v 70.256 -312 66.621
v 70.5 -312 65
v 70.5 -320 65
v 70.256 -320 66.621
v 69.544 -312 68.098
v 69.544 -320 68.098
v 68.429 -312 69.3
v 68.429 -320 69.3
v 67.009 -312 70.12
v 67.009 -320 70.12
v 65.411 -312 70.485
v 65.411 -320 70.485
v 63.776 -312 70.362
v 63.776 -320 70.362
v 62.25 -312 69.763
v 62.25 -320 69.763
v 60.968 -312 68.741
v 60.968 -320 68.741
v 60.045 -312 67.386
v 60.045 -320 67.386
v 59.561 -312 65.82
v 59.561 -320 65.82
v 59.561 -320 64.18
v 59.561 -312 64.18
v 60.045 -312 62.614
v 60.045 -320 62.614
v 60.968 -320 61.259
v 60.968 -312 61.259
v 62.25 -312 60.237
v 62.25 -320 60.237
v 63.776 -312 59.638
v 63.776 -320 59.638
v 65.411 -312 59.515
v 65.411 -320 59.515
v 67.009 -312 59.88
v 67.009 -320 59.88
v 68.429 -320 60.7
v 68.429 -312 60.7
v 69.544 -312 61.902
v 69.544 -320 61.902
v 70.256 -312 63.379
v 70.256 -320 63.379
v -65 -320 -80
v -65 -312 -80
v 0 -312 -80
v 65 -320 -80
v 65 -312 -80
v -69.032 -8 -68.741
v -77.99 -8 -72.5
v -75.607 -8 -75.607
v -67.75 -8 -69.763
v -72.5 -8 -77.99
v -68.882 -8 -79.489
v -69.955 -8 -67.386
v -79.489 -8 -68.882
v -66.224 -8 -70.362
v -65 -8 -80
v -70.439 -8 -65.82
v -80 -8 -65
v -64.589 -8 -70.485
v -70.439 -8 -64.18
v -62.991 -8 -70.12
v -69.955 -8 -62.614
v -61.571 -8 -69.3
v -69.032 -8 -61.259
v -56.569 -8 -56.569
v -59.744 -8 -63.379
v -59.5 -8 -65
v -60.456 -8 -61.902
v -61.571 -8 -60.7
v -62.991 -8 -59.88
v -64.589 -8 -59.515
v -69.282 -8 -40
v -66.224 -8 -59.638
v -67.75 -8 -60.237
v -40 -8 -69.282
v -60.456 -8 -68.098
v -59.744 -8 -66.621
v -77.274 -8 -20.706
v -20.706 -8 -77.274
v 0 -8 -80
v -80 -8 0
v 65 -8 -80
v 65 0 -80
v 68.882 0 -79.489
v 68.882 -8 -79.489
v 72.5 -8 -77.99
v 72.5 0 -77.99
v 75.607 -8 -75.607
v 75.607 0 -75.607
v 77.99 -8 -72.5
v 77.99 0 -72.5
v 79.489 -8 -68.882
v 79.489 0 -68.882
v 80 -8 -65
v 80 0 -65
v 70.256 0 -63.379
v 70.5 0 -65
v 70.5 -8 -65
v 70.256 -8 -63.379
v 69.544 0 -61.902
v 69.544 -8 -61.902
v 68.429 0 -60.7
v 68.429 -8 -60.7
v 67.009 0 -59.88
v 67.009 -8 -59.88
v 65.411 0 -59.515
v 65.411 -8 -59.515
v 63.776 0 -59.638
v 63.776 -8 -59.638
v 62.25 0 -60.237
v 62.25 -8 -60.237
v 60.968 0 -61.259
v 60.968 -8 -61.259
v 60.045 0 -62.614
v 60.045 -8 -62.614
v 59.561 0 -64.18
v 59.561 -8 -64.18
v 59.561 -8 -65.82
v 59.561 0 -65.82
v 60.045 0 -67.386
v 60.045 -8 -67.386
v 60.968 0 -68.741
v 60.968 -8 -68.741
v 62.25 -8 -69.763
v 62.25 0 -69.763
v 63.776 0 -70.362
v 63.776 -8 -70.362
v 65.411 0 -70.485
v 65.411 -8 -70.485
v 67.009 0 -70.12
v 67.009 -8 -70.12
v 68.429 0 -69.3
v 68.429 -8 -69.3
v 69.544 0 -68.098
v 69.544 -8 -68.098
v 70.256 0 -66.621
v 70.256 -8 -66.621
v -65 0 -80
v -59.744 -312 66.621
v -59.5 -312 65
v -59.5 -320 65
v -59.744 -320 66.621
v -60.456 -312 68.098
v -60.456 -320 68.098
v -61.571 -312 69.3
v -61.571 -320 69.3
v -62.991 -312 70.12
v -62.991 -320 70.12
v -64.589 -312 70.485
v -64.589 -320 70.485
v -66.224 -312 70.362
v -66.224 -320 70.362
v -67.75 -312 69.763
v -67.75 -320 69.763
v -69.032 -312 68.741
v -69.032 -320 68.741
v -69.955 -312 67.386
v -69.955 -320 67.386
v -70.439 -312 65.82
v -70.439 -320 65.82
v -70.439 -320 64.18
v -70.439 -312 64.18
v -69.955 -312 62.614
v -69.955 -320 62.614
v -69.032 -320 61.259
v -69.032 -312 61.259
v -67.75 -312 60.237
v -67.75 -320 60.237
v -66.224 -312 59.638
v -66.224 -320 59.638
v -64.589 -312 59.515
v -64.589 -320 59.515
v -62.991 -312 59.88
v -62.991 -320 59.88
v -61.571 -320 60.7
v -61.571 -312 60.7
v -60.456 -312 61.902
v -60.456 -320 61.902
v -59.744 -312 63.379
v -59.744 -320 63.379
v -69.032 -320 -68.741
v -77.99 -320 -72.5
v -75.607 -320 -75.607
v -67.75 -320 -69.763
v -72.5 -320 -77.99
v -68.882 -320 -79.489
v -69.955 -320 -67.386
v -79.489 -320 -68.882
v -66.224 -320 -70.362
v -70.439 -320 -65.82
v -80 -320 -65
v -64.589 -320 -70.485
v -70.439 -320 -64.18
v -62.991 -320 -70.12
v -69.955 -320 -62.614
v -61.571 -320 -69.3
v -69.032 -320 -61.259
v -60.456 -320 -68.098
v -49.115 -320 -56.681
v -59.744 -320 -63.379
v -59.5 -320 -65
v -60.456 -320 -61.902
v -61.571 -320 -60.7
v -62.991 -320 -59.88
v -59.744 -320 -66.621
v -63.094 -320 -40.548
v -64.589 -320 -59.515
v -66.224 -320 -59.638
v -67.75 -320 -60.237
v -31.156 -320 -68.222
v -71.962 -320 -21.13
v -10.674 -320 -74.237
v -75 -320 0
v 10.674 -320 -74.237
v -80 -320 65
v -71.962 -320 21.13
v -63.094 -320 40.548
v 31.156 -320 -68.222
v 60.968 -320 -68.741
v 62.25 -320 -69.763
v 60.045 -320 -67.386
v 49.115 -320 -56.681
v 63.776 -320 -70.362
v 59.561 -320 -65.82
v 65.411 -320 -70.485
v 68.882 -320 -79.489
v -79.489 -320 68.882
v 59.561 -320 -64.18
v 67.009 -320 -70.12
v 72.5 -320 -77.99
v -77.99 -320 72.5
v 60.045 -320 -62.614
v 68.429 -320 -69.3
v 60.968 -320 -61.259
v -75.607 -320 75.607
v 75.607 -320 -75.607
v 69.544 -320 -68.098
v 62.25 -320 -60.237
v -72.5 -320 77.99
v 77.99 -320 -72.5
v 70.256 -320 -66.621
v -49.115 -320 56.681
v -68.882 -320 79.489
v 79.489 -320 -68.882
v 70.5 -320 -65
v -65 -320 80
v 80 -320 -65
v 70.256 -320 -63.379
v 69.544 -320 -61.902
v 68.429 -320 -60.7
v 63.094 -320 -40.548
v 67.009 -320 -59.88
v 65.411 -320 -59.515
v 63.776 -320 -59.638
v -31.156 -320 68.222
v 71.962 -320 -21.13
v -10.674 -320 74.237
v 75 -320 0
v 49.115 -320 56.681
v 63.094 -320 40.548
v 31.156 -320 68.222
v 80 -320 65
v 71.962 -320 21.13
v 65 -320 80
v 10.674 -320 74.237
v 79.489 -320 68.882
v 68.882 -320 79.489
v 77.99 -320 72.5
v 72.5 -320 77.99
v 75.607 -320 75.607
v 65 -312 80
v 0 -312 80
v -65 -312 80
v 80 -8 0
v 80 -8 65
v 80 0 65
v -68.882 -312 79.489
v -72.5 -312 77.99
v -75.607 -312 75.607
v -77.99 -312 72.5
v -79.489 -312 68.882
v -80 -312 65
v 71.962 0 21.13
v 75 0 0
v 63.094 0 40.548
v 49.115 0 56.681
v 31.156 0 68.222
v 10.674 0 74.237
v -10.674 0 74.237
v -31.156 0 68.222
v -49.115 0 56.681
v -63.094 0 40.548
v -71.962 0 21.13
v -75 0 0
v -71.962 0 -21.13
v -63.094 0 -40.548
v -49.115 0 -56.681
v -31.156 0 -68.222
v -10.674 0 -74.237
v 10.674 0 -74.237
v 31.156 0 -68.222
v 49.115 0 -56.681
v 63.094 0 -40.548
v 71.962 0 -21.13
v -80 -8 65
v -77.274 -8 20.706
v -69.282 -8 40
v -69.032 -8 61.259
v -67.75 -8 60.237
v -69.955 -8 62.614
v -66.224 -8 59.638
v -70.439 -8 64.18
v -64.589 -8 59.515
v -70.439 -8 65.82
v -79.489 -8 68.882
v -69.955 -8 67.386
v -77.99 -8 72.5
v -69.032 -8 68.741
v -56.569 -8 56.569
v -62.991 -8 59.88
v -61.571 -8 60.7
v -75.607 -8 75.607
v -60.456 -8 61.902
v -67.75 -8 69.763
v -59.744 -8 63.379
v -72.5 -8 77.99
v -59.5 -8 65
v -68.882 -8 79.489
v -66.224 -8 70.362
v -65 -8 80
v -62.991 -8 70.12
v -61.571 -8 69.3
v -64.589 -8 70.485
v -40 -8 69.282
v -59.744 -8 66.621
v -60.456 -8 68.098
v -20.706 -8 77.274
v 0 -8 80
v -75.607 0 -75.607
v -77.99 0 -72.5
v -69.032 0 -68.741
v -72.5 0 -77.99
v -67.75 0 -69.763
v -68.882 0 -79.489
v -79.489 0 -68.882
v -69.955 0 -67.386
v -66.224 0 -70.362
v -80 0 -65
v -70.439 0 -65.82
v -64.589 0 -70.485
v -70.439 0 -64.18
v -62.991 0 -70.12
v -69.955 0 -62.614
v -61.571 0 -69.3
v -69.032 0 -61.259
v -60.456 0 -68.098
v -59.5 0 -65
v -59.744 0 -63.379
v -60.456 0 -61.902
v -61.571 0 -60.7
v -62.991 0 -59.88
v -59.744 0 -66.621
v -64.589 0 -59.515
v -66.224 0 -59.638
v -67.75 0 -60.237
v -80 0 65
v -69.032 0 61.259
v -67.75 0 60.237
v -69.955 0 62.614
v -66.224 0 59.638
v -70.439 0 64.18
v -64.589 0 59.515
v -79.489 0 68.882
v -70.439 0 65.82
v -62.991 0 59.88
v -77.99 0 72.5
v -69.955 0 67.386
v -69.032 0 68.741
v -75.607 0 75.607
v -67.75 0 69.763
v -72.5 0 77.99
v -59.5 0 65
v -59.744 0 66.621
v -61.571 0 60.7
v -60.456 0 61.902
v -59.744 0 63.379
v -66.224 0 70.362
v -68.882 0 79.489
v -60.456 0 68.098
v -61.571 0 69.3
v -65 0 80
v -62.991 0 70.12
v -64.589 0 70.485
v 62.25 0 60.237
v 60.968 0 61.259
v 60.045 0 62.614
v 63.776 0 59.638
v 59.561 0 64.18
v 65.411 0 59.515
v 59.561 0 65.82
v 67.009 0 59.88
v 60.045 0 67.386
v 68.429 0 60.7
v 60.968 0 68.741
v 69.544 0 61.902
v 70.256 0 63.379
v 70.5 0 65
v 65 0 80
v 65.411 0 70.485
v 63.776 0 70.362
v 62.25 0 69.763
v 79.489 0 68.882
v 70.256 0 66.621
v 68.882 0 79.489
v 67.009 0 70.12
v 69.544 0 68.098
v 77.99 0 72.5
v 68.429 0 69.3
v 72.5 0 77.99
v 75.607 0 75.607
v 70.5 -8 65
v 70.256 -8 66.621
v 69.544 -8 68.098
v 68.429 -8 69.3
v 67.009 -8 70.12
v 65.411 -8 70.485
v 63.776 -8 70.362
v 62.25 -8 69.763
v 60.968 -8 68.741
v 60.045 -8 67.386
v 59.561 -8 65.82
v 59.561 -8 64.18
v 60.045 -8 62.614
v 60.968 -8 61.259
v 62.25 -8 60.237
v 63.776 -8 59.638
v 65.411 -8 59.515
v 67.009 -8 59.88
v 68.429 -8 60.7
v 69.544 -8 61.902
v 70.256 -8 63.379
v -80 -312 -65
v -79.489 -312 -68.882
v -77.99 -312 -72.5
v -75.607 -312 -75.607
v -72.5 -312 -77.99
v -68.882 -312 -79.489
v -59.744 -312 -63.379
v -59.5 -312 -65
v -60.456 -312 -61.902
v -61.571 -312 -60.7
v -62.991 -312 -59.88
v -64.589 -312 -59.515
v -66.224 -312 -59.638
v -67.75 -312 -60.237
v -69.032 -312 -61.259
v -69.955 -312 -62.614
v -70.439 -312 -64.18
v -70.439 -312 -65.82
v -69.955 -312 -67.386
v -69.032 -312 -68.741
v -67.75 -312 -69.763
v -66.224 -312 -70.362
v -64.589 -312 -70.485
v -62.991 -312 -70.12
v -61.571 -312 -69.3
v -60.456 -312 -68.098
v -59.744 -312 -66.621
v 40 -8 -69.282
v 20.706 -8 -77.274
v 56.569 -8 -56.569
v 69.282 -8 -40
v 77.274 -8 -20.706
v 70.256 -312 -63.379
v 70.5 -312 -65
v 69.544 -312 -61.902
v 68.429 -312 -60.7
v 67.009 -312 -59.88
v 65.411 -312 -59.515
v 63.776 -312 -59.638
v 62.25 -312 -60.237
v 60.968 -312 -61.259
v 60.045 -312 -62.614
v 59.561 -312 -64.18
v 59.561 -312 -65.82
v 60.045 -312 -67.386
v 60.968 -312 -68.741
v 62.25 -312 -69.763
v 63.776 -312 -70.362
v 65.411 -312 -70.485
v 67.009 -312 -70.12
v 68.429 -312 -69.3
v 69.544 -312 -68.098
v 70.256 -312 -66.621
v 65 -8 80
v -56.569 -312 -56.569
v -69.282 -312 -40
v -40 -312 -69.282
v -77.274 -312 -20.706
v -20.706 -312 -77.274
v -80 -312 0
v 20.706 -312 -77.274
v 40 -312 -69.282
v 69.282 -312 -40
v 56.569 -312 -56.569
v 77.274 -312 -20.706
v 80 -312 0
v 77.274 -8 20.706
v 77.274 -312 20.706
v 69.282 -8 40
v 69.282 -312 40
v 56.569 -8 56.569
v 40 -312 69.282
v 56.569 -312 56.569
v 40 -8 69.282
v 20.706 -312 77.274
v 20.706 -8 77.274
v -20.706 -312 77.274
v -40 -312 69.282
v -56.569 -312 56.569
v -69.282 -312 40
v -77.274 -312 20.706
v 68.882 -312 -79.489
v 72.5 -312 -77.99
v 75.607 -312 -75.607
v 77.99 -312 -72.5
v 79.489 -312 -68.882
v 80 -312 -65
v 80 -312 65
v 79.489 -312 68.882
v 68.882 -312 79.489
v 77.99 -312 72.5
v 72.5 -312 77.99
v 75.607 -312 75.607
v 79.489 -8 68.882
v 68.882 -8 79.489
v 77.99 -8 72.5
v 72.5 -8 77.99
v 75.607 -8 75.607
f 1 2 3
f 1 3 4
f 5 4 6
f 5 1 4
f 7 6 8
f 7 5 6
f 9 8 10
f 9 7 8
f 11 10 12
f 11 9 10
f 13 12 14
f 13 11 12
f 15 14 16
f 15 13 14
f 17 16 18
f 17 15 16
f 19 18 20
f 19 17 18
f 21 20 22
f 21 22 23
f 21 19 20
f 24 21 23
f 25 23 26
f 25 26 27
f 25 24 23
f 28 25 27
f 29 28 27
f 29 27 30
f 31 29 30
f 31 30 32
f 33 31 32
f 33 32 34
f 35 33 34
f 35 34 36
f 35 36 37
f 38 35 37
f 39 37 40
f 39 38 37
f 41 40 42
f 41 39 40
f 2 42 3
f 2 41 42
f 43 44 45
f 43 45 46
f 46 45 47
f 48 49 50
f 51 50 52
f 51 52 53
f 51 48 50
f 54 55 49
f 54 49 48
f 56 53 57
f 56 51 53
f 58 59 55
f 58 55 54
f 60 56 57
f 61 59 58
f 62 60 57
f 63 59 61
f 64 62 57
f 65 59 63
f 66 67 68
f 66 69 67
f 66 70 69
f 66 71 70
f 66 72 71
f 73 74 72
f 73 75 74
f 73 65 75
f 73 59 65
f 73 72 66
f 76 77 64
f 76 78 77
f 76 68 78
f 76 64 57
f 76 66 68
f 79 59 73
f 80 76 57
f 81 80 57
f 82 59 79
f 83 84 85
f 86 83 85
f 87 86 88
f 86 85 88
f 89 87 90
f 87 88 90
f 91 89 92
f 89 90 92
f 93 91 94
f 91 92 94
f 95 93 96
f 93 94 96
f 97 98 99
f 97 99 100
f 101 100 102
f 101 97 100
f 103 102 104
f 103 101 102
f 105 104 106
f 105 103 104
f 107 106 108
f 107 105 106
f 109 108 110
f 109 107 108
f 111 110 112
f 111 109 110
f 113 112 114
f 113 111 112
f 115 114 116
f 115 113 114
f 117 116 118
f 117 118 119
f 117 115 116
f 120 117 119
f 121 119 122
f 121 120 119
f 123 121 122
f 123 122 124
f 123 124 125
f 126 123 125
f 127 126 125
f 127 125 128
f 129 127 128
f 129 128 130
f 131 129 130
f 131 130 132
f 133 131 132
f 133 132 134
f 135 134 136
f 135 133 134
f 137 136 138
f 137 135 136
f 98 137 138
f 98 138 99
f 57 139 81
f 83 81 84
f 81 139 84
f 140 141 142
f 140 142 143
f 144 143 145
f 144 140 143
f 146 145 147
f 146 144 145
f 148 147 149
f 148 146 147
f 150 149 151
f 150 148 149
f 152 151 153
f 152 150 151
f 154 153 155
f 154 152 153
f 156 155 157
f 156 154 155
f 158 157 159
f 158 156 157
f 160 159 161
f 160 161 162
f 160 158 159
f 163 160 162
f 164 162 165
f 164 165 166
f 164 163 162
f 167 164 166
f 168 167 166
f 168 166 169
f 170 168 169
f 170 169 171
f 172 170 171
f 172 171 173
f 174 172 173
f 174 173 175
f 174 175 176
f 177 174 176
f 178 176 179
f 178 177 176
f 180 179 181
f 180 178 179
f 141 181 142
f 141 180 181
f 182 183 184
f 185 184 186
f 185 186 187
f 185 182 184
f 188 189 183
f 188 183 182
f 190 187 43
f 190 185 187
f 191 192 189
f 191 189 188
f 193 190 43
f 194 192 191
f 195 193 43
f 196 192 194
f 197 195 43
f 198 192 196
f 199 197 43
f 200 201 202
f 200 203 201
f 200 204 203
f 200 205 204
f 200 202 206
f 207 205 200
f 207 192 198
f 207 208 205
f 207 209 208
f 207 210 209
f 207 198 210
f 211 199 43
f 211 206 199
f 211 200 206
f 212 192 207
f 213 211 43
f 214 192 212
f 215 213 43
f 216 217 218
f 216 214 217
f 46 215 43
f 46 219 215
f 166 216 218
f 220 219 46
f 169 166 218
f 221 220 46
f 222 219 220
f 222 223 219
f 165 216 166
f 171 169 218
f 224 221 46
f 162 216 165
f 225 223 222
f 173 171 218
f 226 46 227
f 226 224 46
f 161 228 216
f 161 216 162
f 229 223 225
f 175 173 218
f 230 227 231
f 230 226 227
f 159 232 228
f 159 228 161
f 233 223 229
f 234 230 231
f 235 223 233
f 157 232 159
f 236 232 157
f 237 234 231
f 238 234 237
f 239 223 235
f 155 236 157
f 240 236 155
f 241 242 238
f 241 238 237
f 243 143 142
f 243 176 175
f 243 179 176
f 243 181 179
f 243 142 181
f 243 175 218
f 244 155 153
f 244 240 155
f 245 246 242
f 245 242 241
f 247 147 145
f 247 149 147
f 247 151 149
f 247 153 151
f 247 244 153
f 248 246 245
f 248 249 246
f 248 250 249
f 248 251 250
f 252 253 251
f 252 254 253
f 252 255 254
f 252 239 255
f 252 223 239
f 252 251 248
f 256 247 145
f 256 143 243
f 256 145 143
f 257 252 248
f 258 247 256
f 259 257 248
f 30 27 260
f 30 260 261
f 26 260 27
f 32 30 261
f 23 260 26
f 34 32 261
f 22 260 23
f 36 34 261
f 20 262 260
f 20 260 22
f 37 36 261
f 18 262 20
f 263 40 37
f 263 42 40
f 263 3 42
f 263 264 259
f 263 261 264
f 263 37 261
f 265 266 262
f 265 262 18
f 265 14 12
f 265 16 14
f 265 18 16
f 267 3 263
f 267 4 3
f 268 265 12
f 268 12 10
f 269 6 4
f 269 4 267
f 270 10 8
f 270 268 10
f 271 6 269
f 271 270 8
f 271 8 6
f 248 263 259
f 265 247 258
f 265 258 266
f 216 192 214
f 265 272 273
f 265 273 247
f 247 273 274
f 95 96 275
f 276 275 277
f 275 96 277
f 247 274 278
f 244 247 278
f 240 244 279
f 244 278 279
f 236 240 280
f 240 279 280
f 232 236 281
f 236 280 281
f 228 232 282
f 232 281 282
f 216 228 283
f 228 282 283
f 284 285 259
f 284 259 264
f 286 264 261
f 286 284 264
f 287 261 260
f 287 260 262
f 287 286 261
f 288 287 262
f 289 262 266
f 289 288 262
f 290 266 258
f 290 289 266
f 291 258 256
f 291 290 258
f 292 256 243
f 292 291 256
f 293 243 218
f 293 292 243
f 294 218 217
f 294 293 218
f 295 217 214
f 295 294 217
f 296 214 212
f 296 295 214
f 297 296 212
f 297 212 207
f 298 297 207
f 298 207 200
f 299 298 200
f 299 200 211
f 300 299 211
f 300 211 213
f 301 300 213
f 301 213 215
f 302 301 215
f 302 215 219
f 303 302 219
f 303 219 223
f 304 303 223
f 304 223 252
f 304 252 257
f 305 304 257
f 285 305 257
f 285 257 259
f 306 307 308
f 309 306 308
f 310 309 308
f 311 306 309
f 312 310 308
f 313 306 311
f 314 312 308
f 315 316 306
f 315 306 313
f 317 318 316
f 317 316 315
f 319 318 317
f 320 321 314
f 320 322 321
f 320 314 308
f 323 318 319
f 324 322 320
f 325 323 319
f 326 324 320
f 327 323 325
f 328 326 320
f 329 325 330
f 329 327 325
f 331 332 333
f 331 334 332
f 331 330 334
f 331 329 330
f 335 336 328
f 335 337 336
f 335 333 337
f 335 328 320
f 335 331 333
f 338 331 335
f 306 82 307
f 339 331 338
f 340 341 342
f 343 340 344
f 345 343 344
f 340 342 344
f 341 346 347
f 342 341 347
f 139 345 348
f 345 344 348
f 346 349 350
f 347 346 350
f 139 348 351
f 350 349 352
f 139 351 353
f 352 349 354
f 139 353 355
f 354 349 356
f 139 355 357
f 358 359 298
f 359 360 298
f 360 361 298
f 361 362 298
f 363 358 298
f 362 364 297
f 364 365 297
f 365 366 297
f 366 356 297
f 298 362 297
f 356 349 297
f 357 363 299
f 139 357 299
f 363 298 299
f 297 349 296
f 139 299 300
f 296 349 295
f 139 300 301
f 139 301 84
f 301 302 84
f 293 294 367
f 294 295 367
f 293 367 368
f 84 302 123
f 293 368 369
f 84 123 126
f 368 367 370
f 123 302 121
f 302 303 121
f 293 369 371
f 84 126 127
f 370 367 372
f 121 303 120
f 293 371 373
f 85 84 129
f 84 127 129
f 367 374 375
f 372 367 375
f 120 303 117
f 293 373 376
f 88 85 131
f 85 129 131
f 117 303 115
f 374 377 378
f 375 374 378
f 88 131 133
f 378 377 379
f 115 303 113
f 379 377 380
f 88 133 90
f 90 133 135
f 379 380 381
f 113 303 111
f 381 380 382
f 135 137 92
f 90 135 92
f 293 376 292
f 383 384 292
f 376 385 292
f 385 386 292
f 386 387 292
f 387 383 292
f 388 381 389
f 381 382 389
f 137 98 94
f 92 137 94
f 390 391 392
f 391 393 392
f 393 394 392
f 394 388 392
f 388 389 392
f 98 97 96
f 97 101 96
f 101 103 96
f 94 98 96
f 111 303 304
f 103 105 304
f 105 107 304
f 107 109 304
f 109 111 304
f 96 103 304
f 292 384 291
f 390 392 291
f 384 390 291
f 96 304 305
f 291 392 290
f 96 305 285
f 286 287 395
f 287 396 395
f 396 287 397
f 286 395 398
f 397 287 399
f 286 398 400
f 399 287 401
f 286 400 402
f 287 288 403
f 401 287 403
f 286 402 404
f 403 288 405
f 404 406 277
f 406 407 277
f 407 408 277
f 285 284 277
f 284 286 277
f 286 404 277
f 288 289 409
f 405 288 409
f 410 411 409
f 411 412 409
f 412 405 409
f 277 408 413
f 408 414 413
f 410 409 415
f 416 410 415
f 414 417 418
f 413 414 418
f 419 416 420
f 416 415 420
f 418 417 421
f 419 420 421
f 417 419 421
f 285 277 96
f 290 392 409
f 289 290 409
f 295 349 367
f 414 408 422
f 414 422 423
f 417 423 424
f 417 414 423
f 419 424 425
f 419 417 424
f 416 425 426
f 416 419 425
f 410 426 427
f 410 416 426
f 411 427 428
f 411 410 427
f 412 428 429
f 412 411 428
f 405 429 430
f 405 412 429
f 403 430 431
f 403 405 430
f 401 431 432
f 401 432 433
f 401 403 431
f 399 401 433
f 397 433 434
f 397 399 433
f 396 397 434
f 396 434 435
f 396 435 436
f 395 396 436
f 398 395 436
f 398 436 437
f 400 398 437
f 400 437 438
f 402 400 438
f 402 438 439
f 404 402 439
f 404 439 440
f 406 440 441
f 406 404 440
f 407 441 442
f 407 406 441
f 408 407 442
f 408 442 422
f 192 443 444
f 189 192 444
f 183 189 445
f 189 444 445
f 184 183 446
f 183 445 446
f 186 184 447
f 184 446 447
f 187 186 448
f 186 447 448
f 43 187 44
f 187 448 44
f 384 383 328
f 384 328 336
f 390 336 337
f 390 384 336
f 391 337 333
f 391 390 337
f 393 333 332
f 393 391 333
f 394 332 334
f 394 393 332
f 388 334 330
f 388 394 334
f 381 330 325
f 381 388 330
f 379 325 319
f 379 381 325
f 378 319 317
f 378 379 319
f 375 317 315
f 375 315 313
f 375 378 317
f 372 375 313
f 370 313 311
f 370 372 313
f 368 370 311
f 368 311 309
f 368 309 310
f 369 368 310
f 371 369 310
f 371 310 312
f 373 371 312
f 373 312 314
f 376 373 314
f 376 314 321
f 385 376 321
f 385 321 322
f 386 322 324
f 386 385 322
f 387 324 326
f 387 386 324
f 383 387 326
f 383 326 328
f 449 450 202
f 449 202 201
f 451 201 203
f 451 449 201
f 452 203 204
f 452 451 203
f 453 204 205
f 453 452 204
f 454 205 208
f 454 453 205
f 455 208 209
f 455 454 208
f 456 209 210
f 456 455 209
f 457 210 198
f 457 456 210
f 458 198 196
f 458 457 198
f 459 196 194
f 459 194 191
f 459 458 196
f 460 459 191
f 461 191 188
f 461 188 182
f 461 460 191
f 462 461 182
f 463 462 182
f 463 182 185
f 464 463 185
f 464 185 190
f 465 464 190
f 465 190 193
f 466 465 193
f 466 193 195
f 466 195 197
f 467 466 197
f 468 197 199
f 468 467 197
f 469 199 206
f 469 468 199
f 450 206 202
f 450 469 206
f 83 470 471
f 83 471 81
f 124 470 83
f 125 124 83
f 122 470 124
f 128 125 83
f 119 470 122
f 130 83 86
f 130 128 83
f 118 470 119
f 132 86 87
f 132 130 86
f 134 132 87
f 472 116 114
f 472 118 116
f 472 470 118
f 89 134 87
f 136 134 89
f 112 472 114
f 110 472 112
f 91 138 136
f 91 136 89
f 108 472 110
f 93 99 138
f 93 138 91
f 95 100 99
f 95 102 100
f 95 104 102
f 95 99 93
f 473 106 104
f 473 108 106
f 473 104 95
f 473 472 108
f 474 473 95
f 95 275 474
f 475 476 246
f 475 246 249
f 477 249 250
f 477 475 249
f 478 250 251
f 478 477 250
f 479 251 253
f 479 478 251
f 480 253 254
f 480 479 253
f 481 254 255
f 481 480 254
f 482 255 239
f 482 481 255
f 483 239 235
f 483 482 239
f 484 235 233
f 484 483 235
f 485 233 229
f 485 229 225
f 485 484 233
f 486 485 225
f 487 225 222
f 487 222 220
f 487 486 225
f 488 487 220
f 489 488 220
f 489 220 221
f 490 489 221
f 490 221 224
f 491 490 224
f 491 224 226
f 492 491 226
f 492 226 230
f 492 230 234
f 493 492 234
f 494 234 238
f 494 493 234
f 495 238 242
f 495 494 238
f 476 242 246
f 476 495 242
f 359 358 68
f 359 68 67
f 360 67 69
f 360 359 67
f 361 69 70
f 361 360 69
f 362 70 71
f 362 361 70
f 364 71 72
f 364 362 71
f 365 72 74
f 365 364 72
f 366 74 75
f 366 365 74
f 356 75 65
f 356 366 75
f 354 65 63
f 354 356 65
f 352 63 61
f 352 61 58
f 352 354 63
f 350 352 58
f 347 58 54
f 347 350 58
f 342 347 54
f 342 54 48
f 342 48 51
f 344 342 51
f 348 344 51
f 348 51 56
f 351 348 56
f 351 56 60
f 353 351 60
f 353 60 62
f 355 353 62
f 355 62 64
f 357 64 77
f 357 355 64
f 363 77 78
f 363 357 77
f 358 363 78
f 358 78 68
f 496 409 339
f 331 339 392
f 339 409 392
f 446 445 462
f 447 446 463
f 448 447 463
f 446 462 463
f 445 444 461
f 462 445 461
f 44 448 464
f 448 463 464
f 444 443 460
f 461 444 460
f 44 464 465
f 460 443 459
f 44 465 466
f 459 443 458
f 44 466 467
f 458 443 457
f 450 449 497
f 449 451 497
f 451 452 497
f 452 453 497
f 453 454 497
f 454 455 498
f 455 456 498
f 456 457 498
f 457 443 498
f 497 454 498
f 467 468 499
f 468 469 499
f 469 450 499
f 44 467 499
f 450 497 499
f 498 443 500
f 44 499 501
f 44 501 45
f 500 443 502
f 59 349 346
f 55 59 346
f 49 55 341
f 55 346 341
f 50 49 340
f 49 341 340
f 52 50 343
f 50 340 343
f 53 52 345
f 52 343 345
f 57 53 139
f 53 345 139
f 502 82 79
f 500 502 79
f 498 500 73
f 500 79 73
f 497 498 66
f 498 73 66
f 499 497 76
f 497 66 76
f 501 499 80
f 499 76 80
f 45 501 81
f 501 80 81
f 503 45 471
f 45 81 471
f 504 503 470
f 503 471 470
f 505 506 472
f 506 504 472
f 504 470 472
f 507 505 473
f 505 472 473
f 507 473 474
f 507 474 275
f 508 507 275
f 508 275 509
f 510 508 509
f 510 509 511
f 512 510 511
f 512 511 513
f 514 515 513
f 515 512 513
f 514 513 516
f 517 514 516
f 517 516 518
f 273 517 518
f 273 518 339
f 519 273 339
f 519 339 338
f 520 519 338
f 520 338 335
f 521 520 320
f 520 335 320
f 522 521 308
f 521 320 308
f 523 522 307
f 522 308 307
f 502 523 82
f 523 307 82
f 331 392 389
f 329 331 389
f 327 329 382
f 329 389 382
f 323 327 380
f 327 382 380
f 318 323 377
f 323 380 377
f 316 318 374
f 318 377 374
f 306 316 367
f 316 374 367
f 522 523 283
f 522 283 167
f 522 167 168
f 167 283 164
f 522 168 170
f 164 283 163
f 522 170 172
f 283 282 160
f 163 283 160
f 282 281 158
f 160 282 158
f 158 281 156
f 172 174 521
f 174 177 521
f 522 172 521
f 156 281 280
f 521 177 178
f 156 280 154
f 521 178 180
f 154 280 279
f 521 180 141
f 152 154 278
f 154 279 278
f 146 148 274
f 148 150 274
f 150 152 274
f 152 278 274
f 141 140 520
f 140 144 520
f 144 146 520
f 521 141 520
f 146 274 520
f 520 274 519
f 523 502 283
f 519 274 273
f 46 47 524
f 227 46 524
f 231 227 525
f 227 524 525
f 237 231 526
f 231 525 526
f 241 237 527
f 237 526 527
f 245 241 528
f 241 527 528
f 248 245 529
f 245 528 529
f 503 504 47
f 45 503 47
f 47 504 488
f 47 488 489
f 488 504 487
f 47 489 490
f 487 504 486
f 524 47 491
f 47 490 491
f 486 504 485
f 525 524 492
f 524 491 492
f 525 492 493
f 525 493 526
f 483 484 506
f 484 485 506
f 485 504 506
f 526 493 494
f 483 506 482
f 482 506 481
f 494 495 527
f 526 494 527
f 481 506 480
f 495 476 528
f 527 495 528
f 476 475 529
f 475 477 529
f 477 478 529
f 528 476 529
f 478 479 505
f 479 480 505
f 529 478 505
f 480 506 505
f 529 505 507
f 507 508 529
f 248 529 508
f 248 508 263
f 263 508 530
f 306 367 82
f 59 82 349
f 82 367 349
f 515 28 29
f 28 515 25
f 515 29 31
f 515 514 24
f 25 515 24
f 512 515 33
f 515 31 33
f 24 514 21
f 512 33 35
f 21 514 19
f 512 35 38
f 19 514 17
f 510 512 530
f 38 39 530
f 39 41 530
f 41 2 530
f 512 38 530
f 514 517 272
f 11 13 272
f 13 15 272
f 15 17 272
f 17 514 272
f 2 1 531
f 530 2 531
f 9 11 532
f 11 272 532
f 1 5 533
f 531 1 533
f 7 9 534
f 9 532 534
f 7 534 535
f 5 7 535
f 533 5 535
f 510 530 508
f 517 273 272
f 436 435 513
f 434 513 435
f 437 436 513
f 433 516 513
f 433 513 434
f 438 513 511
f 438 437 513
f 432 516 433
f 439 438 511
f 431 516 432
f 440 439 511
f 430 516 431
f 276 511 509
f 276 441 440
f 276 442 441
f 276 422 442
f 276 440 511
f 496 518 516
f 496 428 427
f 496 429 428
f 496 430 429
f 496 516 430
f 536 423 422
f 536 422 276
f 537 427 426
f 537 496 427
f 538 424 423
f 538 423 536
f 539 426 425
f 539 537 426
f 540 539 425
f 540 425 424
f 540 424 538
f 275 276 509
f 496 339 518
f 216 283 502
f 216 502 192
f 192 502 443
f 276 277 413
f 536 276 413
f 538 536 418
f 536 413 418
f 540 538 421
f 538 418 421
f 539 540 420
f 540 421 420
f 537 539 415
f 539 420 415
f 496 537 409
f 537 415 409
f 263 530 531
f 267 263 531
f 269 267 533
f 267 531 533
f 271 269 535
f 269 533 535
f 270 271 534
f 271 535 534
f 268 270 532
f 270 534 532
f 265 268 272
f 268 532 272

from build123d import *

# Parameters (mm, degrees)
F1_R     = 5.5
F1_R_2   = 75
F2_DEPTH = 8
F3_DEPTH = 320
F4_START = 312
F4_DEPTH = 8


with BuildPart() as f2:
    # F1 (on Front) → F2 (new body)
    with BuildSketch(Plane.XZ):
        with BuildLine():
            Line((0, -80), (65, -80))
            ThreePointArc((65, -80), (75.6066017178, -75.6066017178), (80, -65))
            Line((80, -65), (80, 0))
            ThreePointArc((80, 0), (56.5685424949, -56.5685424949), (0, -80))
        make_face()
        with Locations((65, -65)):
            Circle(F1_R, mode=Mode.SUBTRACT)
        with BuildLine():
            Line((-65, -80), (0, -80))
            ThreePointArc((0, -80), (-56.5685424251, -56.5685425648), (-80, -1.976e-07))
            Line((-80, -1.976e-07), (-80, -65))
            ThreePointArc((-80, -65), (-75.6066017178, -75.6066017178), (-65, -80))
        make_face()
        with Locations((-65, -65)):
            Circle(F1_R, mode=Mode.SUBTRACT)
        with BuildLine():
            ThreePointArc((-80, -1.976e-07), (-56.5685424251, -56.5685425648), (0, -80))
            ThreePointArc((0, -80), (56.5685424949, -56.5685424949), (80, 0))
            ThreePointArc((80, 0), (56.5685424949, 56.5685424949), (0, 80))
            ThreePointArc((0, 80), (-56.5685425648, 56.5685424251), (-80, -1.976e-07))
        make_face()
        Circle(F1_R_2, mode=Mode.SUBTRACT)
        with BuildLine():
            Line((-80, 65), (-80, -1.976e-07))
            ThreePointArc((-80, -1.976e-07), (-56.5685425648, 56.5685424251), (0, 80))
            Line((0, 80), (-65, 80))
            ThreePointArc((-65, 80), (-75.6066017178, 75.6066017178), (-80, 65))
        make_face()
        with Locations((-65, 65)):
            Circle(F1_R, mode=Mode.SUBTRACT)
        with BuildLine():
            ThreePointArc((0, 80), (56.5685424949, 56.5685424949), (80, 0))
            Line((80, 0), (80, 65))
            ThreePointArc((80, 65), (75.6066017178, 75.6066017178), (65, 80))
            Line((65, 80), (0, 80))
        make_face()
        with Locations((65, 65)):
            Circle(F1_R, mode=Mode.SUBTRACT)
    extrude(amount=F2_DEPTH)

    # F1 (on Front) → F3 (join, through all)
    with BuildSketch(Plane.XZ):
        with BuildLine():
            ThreePointArc((-80, -1.976e-07), (-56.5685424251, -56.5685425648), (0, -80))
            ThreePointArc((0, -80), (56.5685424949, -56.5685424949), (80, 0))
            ThreePointArc((80, 0), (56.5685424949, 56.5685424949), (0, 80))
            ThreePointArc((0, 80), (-56.5685425648, 56.5685424251), (-80, -1.976e-07))
        make_face()
        Circle(F1_R_2, mode=Mode.SUBTRACT)
    extrude(amount=F3_DEPTH)

    # F1 (on Front) → F4 (join)
    with BuildSketch(Plane.XZ.offset(F4_START)):
        with BuildLine():
            Line((0, -80), (65, -80))
            ThreePointArc((65, -80), (75.6066017178, -75.6066017178), (80, -65))
            Line((80, -65), (80, 0))
            ThreePointArc((80, 0), (56.5685424949, -56.5685424949), (0, -80))
        make_face()
        with Locations((65, -65)):
            Circle(F1_R, mode=Mode.SUBTRACT)
        with BuildLine():
            Line((-65, -80), (0, -80))
            ThreePointArc((0, -80), (-56.5685424251, -56.5685425648), (-80, -1.976e-07))
            Line((-80, -1.976e-07), (-80, -65))
            ThreePointArc((-80, -65), (-75.6066017178, -75.6066017178), (-65, -80))
        make_face()
        with Locations((-65, -65)):
            Circle(F1_R, mode=Mode.SUBTRACT)
        with BuildLine():
            ThreePointArc((0, 80), (56.5685424949, 56.5685424949), (80, 0))
            Line((80, 0), (80, 65))
            ThreePointArc((80, 65), (75.6066017178, 75.6066017178), (65, 80))
            Line((65, 80), (0, 80))
        make_face()
        with Locations((65, 65)):
            Circle(F1_R, mode=Mode.SUBTRACT)
        with BuildLine():
            Line((-80, 65), (-80, -1.976e-07))
            ThreePointArc((-80, -1.976e-07), (-56.5685425648, 56.5685424251), (0, 80))
            Line((0, 80), (-65, 80))
            ThreePointArc((-65, 80), (-75.6066017178, 75.6066017178), (-80, 65))
        make_face()
        with Locations((-65, 65)):
            Circle(F1_R, mode=Mode.SUBTRACT)
    extrude(amount=F4_DEPTH)


solid = f2.part
